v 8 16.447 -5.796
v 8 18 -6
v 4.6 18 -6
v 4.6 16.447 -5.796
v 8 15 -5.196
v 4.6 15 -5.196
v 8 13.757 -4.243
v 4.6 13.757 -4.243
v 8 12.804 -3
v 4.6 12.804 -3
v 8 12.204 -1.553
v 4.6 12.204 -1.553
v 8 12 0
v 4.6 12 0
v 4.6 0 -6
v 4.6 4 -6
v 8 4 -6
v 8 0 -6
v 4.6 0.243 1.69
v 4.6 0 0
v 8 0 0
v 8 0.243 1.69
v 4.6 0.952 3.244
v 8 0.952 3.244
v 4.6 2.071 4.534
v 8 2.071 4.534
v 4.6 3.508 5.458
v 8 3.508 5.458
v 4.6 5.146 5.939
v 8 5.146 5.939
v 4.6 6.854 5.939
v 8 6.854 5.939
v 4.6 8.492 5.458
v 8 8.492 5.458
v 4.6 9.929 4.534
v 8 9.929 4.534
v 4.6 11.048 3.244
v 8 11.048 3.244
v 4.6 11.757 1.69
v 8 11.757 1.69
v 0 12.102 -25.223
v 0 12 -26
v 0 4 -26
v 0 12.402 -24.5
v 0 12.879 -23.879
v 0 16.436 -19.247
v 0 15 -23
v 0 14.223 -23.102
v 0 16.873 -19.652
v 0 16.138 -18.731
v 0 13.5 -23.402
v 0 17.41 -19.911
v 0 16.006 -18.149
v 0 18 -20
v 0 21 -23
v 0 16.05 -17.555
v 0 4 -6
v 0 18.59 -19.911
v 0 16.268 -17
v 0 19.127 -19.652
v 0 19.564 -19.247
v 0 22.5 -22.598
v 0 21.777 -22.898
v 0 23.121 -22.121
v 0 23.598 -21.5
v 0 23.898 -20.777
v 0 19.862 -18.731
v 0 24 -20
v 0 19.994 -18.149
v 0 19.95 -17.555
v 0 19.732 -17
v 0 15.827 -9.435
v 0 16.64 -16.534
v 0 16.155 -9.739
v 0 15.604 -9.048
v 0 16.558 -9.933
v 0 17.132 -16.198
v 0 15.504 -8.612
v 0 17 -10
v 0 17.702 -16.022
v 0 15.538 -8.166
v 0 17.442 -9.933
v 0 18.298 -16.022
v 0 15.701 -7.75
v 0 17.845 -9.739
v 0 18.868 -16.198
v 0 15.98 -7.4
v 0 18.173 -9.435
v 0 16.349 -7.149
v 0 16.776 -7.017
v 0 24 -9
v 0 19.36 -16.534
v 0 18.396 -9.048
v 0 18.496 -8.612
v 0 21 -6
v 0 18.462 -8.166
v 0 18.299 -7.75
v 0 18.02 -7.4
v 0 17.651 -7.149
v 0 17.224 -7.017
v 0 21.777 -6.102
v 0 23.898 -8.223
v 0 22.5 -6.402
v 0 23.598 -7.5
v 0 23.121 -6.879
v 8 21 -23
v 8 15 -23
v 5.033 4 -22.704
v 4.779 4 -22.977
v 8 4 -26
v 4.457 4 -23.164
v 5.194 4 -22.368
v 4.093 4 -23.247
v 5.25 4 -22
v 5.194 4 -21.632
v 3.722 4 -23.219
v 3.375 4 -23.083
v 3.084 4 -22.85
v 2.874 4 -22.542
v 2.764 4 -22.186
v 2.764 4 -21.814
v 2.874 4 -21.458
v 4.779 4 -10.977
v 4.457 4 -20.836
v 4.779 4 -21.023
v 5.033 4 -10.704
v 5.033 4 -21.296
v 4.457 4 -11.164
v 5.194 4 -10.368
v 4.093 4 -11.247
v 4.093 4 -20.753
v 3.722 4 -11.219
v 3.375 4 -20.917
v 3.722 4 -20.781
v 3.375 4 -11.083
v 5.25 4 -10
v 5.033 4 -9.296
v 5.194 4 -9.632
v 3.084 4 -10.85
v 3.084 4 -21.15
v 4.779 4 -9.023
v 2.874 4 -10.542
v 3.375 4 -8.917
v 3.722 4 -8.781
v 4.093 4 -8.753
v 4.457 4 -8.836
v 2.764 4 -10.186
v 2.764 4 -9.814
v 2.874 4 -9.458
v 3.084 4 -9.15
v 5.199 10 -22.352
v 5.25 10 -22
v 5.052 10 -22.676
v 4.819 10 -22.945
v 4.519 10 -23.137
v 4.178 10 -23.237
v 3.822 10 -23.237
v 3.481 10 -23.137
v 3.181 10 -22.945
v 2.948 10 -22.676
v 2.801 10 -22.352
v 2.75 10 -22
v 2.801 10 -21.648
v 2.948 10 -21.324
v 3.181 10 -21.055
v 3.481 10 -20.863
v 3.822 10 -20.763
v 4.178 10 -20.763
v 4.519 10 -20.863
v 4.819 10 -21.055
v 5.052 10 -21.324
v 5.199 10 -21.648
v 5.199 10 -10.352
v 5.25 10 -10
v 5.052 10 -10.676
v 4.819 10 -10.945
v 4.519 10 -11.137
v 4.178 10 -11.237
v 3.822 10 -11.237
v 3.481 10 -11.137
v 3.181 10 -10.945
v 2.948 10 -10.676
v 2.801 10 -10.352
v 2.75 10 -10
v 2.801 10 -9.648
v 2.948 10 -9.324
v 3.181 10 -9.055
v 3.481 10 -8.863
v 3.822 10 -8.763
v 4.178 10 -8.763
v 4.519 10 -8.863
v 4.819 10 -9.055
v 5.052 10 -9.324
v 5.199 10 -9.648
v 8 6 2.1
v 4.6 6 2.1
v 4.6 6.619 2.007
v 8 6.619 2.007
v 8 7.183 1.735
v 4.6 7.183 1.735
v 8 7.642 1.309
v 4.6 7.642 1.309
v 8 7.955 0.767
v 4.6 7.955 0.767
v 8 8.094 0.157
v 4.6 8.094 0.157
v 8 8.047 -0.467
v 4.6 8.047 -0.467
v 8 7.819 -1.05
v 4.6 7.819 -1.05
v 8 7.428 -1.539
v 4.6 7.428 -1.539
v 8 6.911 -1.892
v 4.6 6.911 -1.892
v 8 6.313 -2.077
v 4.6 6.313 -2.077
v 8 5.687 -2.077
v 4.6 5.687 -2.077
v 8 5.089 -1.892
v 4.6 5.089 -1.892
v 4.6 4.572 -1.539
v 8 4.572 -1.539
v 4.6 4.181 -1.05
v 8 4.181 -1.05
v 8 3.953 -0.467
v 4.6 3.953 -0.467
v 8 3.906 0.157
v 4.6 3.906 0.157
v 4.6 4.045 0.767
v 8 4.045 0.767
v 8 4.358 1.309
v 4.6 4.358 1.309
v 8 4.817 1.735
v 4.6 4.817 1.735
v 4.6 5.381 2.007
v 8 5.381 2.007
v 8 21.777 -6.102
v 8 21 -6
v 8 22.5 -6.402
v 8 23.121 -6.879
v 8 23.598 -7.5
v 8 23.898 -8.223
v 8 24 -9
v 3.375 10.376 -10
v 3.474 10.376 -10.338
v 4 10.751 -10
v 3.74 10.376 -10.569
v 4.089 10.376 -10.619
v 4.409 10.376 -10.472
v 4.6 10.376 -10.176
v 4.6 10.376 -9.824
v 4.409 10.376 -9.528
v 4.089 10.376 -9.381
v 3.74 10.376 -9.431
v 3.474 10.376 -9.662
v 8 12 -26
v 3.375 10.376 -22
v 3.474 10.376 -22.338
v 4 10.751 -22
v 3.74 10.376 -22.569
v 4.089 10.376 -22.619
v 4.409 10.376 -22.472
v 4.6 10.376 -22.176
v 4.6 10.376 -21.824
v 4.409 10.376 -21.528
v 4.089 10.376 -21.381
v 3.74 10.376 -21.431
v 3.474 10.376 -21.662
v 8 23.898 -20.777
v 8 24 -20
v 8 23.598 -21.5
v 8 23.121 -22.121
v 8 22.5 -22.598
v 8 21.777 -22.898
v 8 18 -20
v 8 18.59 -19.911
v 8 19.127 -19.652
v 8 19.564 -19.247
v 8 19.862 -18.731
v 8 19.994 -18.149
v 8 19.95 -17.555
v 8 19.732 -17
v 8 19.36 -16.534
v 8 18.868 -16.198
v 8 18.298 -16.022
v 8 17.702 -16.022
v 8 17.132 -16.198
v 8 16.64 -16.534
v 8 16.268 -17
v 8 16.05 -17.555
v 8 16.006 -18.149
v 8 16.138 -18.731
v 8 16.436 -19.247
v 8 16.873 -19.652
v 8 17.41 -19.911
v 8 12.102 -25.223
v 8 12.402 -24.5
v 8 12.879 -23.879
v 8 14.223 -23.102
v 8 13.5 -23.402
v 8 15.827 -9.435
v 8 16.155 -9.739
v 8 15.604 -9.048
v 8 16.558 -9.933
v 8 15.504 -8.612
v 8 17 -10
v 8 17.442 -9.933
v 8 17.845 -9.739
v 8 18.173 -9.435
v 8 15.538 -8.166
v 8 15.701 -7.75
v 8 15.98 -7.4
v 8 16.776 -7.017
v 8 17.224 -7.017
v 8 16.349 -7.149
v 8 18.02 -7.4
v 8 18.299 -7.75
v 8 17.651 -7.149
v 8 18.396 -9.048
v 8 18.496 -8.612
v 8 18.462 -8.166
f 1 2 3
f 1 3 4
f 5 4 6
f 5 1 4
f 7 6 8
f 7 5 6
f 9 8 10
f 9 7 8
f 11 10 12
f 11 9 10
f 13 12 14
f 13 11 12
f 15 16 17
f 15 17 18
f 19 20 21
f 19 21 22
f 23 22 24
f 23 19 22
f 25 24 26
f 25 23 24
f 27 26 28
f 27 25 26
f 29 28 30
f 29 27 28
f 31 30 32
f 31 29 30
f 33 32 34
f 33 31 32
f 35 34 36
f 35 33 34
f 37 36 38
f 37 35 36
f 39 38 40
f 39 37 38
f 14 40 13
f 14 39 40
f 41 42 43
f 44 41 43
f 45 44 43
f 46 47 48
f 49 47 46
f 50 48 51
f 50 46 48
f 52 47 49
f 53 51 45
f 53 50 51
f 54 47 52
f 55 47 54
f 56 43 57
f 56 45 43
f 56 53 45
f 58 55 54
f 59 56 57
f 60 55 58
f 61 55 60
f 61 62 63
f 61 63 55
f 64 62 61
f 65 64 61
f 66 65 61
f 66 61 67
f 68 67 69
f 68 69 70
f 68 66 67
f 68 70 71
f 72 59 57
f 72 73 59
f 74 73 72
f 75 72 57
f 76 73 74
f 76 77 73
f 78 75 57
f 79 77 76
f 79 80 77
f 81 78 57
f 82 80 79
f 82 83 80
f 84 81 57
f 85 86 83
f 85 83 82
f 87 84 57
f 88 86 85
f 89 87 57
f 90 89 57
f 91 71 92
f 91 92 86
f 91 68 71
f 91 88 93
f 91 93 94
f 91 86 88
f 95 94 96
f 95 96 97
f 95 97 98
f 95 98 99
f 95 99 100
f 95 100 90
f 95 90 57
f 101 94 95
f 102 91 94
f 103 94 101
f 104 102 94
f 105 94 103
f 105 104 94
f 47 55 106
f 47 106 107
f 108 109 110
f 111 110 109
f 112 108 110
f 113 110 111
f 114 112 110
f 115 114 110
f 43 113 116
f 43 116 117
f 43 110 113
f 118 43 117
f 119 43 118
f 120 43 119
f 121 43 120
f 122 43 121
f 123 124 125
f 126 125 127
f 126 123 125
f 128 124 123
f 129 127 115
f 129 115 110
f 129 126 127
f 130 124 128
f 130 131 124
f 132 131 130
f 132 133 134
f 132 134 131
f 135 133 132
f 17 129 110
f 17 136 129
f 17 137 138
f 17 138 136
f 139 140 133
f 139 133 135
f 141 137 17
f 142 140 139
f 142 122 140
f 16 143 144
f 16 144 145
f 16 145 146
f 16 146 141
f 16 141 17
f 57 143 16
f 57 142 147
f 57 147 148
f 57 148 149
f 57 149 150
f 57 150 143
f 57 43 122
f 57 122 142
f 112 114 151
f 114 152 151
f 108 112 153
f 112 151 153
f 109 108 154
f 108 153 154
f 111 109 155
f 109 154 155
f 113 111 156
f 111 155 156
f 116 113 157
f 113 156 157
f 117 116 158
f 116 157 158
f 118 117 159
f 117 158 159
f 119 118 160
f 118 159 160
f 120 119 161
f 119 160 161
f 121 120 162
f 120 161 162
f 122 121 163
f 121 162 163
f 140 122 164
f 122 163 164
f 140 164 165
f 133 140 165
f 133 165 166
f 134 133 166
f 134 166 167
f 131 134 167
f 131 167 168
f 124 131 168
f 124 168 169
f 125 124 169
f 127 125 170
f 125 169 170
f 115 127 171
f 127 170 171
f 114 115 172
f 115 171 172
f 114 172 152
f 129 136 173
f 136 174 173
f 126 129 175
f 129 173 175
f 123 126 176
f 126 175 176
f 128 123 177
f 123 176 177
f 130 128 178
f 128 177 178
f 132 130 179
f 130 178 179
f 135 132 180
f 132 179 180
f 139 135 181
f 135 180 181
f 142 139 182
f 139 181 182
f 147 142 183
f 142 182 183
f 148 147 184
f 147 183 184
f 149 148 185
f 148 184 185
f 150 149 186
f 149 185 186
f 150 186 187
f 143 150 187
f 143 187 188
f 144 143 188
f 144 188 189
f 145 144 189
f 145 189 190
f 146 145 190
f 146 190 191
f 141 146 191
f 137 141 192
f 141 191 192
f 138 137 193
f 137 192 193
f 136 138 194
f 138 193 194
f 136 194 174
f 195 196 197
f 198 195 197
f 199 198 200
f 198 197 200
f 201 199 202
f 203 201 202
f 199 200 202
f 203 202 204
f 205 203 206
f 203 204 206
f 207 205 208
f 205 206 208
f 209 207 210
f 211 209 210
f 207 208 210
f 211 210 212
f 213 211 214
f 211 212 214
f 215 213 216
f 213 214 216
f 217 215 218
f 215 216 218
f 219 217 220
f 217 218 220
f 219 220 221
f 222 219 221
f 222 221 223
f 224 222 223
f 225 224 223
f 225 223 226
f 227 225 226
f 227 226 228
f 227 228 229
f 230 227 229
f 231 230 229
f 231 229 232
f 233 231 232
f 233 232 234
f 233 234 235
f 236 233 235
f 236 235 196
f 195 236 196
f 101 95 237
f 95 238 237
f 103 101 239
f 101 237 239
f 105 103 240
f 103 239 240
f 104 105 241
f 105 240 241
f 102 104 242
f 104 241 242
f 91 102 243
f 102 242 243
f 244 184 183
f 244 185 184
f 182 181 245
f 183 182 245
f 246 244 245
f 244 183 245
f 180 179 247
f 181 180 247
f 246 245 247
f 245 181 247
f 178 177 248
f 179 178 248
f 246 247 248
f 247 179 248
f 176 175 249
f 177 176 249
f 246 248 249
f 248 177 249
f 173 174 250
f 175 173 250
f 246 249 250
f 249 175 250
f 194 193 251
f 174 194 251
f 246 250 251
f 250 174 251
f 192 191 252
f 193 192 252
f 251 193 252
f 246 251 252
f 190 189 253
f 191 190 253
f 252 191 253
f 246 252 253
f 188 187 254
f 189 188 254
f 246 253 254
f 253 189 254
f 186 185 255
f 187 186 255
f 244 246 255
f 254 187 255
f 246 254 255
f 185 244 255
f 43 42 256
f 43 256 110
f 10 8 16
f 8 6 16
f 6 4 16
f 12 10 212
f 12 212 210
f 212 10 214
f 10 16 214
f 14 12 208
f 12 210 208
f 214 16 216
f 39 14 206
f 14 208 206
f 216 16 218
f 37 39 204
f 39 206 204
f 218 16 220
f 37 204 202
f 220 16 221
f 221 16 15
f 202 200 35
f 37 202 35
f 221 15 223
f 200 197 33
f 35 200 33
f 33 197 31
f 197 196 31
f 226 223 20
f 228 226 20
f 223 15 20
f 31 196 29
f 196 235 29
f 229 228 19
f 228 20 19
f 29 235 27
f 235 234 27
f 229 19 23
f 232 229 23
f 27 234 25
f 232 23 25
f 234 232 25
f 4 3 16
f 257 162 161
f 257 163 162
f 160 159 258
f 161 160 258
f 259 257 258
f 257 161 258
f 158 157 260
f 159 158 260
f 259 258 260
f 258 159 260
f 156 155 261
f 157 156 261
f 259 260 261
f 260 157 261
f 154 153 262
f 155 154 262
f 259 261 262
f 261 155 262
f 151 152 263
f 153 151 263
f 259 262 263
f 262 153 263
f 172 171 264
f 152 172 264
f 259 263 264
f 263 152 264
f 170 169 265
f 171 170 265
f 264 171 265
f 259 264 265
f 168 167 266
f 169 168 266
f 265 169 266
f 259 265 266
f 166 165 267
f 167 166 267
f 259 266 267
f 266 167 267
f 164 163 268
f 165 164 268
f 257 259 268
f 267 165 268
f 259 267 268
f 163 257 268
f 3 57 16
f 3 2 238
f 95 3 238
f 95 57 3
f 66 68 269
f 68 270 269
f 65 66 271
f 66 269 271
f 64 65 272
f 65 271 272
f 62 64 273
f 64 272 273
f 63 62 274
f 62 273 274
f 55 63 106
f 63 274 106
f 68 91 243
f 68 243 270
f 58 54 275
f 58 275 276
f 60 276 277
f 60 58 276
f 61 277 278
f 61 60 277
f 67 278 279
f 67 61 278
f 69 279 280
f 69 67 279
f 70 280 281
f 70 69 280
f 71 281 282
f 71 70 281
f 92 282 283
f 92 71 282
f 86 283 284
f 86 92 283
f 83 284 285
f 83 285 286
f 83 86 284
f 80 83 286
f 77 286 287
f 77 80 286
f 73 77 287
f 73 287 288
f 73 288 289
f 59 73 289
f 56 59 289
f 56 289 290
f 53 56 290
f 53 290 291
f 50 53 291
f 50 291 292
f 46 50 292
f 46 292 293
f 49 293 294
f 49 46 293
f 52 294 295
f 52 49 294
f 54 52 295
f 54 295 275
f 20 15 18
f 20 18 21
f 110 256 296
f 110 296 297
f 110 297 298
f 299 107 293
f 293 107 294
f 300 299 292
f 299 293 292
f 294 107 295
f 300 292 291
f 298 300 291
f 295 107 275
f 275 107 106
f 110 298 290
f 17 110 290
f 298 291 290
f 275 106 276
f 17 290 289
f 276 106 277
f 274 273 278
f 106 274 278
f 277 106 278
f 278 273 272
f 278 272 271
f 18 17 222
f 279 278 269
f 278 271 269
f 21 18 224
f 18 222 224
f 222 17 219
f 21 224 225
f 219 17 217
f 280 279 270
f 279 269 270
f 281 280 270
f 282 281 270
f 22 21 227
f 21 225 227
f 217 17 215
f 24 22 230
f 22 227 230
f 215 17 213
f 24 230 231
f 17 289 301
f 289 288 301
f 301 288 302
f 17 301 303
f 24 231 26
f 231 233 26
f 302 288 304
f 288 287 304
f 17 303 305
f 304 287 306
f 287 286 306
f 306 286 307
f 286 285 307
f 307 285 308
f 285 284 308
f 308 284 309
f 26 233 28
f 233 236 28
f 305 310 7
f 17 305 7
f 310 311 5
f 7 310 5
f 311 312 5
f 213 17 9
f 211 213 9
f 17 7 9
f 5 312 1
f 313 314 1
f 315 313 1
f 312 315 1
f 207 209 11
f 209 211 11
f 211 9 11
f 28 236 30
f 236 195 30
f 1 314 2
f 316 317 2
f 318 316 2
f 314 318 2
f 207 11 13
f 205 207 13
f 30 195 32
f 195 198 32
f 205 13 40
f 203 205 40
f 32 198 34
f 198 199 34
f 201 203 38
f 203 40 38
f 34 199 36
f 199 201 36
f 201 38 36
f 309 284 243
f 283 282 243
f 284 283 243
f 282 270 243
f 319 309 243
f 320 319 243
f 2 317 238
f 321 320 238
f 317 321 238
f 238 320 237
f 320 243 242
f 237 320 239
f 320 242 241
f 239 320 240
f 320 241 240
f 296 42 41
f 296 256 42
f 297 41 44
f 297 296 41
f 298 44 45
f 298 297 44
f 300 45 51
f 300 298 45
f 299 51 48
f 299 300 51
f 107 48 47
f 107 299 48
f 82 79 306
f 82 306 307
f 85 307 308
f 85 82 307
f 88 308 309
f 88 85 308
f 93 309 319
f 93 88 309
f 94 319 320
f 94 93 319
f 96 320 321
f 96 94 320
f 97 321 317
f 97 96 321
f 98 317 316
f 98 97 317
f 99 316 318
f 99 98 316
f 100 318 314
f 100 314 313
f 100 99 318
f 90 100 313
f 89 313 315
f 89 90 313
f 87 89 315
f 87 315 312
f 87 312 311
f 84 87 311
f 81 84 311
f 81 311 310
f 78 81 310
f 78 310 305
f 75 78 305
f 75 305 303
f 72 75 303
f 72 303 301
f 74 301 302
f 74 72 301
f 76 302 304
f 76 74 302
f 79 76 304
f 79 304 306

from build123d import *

# Parameters (mm, degrees)
SKETCH1_R                       = 1.5
SKETCH1_R_2                     = 2
BOSS_EXTRUDE1_DEPTH             = 8
FILLET1_R                       = 3
FILLET2_R                       = 6
TAP_DRILL_FOR_M5X0_8_TAP1_D     = 4.2
TAP_DRILL_FOR_M3X0_5_TAP1_D     = 2.5
TAP_DRILL_FOR_M3X0_5_TAP1_DEPTH = 6
TAP_DRILL_FOR_M3X0_5_TAP1_TIP   = 0.751075774
CUT_EXTRUDE1_REACH              = 38.277
SKETCH7_W                       = 4.6
SKETCH7_H                       = 12


with BuildPart() as part:
    # Sketch1 → Boss-Extrude1 (new body)
    with BuildSketch(Plane(origin=(0, 0, 0), x_dir=(0, 0, -1), z_dir=(1, 0, 0))):
        with BuildLine():
            Line((6, 0), (0, 0))
            ThreePointArc((0, 0), (-6, 6), (0, 12))
            Line((0, 12), (6, 12))
            Line((6, 12), (6, 24))
            Line((6, 24), (23, 24))
            Line((23, 24), (23, 12))
            Line((23, 12), (26, 12))
            Line((26, 12), (26, 4))
            Line((26, 4), (6, 4))
            Line((6, 4), (6, 0))
        make_face()
        with Locations((8.5, 17)):
            Circle(SKETCH1_R, mode=Mode.SUBTRACT)
        with Locations((18, 18)):
            Circle(SKETCH1_R_2, mode=Mode.SUBTRACT)
    extrude(amount=BOSS_EXTRUDE1_DEPTH)

    # Fillet1
    fillet1_edges = [part.edges().sort_by_distance(p)[0] for p in [
        (4, 12, -23),
        (4, 24, -6),
        (4, 24, -23),
    ]]
    fillet(fillet1_edges, radius=FILLET1_R - 0.0001)  # a hair under: the kernel refuses the full size

    # Fillet2
    fillet2_edges = [part.edges().sort_by_distance(p)[0] for p in [
        (4, 12, -6),
    ]]
    fillet(fillet2_edges, radius=FILLET2_R - 0.0001)  # a hair under: the kernel refuses the full size

    # Tap Drill for M5x0.8 Tap1 (through all)
    with Locations(Plane(origin=(8, 0, 0), x_dir=(0, 0, -1), z_dir=(1, 0, 0))):
        with Locations((0, 6)):
            Hole(TAP_DRILL_FOR_M5X0_8_TAP1_D / 2)

    # Tap Drill for M3x0.5 Tap1
    with Locations(Plane(origin=(0, 4, 0), x_dir=(-1, 0, 0), z_dir=(0, -1, 0))):
        with Locations((-4, 10), (-4, 22)):
            Hole(TAP_DRILL_FOR_M3X0_5_TAP1_D / 2, depth=TAP_DRILL_FOR_M3X0_5_TAP1_DEPTH)
            with Locations((0, 0, -(TAP_DRILL_FOR_M3X0_5_TAP1_DEPTH + TAP_DRILL_FOR_M3X0_5_TAP1_TIP / 2))):  # 118° drill point
                Cone(0, TAP_DRILL_FOR_M3X0_5_TAP1_D / 2, TAP_DRILL_FOR_M3X0_5_TAP1_TIP, mode=Mode.SUBTRACT)

    # Sketch7 → Cut-Extrude1 (cut, up to next)
    with BuildSketch(Plane.XZ, mode=Mode.PRIVATE) as cut_extrude1_sk1:
        with Locations((2.3, 0)):
            Rectangle(SKETCH7_W, SKETCH7_H)
    cut_extrude1_tool1 = extrude(cut_extrude1_sk1.sketch, amount=-CUT_EXTRUDE1_REACH, mode=Mode.PRIVATE) & part.part
    add(cut_extrude1_tool1.solids().sort_by_distance((2.3, 0, 0))[0], mode=Mode.SUBTRACT)


solid = part.part
